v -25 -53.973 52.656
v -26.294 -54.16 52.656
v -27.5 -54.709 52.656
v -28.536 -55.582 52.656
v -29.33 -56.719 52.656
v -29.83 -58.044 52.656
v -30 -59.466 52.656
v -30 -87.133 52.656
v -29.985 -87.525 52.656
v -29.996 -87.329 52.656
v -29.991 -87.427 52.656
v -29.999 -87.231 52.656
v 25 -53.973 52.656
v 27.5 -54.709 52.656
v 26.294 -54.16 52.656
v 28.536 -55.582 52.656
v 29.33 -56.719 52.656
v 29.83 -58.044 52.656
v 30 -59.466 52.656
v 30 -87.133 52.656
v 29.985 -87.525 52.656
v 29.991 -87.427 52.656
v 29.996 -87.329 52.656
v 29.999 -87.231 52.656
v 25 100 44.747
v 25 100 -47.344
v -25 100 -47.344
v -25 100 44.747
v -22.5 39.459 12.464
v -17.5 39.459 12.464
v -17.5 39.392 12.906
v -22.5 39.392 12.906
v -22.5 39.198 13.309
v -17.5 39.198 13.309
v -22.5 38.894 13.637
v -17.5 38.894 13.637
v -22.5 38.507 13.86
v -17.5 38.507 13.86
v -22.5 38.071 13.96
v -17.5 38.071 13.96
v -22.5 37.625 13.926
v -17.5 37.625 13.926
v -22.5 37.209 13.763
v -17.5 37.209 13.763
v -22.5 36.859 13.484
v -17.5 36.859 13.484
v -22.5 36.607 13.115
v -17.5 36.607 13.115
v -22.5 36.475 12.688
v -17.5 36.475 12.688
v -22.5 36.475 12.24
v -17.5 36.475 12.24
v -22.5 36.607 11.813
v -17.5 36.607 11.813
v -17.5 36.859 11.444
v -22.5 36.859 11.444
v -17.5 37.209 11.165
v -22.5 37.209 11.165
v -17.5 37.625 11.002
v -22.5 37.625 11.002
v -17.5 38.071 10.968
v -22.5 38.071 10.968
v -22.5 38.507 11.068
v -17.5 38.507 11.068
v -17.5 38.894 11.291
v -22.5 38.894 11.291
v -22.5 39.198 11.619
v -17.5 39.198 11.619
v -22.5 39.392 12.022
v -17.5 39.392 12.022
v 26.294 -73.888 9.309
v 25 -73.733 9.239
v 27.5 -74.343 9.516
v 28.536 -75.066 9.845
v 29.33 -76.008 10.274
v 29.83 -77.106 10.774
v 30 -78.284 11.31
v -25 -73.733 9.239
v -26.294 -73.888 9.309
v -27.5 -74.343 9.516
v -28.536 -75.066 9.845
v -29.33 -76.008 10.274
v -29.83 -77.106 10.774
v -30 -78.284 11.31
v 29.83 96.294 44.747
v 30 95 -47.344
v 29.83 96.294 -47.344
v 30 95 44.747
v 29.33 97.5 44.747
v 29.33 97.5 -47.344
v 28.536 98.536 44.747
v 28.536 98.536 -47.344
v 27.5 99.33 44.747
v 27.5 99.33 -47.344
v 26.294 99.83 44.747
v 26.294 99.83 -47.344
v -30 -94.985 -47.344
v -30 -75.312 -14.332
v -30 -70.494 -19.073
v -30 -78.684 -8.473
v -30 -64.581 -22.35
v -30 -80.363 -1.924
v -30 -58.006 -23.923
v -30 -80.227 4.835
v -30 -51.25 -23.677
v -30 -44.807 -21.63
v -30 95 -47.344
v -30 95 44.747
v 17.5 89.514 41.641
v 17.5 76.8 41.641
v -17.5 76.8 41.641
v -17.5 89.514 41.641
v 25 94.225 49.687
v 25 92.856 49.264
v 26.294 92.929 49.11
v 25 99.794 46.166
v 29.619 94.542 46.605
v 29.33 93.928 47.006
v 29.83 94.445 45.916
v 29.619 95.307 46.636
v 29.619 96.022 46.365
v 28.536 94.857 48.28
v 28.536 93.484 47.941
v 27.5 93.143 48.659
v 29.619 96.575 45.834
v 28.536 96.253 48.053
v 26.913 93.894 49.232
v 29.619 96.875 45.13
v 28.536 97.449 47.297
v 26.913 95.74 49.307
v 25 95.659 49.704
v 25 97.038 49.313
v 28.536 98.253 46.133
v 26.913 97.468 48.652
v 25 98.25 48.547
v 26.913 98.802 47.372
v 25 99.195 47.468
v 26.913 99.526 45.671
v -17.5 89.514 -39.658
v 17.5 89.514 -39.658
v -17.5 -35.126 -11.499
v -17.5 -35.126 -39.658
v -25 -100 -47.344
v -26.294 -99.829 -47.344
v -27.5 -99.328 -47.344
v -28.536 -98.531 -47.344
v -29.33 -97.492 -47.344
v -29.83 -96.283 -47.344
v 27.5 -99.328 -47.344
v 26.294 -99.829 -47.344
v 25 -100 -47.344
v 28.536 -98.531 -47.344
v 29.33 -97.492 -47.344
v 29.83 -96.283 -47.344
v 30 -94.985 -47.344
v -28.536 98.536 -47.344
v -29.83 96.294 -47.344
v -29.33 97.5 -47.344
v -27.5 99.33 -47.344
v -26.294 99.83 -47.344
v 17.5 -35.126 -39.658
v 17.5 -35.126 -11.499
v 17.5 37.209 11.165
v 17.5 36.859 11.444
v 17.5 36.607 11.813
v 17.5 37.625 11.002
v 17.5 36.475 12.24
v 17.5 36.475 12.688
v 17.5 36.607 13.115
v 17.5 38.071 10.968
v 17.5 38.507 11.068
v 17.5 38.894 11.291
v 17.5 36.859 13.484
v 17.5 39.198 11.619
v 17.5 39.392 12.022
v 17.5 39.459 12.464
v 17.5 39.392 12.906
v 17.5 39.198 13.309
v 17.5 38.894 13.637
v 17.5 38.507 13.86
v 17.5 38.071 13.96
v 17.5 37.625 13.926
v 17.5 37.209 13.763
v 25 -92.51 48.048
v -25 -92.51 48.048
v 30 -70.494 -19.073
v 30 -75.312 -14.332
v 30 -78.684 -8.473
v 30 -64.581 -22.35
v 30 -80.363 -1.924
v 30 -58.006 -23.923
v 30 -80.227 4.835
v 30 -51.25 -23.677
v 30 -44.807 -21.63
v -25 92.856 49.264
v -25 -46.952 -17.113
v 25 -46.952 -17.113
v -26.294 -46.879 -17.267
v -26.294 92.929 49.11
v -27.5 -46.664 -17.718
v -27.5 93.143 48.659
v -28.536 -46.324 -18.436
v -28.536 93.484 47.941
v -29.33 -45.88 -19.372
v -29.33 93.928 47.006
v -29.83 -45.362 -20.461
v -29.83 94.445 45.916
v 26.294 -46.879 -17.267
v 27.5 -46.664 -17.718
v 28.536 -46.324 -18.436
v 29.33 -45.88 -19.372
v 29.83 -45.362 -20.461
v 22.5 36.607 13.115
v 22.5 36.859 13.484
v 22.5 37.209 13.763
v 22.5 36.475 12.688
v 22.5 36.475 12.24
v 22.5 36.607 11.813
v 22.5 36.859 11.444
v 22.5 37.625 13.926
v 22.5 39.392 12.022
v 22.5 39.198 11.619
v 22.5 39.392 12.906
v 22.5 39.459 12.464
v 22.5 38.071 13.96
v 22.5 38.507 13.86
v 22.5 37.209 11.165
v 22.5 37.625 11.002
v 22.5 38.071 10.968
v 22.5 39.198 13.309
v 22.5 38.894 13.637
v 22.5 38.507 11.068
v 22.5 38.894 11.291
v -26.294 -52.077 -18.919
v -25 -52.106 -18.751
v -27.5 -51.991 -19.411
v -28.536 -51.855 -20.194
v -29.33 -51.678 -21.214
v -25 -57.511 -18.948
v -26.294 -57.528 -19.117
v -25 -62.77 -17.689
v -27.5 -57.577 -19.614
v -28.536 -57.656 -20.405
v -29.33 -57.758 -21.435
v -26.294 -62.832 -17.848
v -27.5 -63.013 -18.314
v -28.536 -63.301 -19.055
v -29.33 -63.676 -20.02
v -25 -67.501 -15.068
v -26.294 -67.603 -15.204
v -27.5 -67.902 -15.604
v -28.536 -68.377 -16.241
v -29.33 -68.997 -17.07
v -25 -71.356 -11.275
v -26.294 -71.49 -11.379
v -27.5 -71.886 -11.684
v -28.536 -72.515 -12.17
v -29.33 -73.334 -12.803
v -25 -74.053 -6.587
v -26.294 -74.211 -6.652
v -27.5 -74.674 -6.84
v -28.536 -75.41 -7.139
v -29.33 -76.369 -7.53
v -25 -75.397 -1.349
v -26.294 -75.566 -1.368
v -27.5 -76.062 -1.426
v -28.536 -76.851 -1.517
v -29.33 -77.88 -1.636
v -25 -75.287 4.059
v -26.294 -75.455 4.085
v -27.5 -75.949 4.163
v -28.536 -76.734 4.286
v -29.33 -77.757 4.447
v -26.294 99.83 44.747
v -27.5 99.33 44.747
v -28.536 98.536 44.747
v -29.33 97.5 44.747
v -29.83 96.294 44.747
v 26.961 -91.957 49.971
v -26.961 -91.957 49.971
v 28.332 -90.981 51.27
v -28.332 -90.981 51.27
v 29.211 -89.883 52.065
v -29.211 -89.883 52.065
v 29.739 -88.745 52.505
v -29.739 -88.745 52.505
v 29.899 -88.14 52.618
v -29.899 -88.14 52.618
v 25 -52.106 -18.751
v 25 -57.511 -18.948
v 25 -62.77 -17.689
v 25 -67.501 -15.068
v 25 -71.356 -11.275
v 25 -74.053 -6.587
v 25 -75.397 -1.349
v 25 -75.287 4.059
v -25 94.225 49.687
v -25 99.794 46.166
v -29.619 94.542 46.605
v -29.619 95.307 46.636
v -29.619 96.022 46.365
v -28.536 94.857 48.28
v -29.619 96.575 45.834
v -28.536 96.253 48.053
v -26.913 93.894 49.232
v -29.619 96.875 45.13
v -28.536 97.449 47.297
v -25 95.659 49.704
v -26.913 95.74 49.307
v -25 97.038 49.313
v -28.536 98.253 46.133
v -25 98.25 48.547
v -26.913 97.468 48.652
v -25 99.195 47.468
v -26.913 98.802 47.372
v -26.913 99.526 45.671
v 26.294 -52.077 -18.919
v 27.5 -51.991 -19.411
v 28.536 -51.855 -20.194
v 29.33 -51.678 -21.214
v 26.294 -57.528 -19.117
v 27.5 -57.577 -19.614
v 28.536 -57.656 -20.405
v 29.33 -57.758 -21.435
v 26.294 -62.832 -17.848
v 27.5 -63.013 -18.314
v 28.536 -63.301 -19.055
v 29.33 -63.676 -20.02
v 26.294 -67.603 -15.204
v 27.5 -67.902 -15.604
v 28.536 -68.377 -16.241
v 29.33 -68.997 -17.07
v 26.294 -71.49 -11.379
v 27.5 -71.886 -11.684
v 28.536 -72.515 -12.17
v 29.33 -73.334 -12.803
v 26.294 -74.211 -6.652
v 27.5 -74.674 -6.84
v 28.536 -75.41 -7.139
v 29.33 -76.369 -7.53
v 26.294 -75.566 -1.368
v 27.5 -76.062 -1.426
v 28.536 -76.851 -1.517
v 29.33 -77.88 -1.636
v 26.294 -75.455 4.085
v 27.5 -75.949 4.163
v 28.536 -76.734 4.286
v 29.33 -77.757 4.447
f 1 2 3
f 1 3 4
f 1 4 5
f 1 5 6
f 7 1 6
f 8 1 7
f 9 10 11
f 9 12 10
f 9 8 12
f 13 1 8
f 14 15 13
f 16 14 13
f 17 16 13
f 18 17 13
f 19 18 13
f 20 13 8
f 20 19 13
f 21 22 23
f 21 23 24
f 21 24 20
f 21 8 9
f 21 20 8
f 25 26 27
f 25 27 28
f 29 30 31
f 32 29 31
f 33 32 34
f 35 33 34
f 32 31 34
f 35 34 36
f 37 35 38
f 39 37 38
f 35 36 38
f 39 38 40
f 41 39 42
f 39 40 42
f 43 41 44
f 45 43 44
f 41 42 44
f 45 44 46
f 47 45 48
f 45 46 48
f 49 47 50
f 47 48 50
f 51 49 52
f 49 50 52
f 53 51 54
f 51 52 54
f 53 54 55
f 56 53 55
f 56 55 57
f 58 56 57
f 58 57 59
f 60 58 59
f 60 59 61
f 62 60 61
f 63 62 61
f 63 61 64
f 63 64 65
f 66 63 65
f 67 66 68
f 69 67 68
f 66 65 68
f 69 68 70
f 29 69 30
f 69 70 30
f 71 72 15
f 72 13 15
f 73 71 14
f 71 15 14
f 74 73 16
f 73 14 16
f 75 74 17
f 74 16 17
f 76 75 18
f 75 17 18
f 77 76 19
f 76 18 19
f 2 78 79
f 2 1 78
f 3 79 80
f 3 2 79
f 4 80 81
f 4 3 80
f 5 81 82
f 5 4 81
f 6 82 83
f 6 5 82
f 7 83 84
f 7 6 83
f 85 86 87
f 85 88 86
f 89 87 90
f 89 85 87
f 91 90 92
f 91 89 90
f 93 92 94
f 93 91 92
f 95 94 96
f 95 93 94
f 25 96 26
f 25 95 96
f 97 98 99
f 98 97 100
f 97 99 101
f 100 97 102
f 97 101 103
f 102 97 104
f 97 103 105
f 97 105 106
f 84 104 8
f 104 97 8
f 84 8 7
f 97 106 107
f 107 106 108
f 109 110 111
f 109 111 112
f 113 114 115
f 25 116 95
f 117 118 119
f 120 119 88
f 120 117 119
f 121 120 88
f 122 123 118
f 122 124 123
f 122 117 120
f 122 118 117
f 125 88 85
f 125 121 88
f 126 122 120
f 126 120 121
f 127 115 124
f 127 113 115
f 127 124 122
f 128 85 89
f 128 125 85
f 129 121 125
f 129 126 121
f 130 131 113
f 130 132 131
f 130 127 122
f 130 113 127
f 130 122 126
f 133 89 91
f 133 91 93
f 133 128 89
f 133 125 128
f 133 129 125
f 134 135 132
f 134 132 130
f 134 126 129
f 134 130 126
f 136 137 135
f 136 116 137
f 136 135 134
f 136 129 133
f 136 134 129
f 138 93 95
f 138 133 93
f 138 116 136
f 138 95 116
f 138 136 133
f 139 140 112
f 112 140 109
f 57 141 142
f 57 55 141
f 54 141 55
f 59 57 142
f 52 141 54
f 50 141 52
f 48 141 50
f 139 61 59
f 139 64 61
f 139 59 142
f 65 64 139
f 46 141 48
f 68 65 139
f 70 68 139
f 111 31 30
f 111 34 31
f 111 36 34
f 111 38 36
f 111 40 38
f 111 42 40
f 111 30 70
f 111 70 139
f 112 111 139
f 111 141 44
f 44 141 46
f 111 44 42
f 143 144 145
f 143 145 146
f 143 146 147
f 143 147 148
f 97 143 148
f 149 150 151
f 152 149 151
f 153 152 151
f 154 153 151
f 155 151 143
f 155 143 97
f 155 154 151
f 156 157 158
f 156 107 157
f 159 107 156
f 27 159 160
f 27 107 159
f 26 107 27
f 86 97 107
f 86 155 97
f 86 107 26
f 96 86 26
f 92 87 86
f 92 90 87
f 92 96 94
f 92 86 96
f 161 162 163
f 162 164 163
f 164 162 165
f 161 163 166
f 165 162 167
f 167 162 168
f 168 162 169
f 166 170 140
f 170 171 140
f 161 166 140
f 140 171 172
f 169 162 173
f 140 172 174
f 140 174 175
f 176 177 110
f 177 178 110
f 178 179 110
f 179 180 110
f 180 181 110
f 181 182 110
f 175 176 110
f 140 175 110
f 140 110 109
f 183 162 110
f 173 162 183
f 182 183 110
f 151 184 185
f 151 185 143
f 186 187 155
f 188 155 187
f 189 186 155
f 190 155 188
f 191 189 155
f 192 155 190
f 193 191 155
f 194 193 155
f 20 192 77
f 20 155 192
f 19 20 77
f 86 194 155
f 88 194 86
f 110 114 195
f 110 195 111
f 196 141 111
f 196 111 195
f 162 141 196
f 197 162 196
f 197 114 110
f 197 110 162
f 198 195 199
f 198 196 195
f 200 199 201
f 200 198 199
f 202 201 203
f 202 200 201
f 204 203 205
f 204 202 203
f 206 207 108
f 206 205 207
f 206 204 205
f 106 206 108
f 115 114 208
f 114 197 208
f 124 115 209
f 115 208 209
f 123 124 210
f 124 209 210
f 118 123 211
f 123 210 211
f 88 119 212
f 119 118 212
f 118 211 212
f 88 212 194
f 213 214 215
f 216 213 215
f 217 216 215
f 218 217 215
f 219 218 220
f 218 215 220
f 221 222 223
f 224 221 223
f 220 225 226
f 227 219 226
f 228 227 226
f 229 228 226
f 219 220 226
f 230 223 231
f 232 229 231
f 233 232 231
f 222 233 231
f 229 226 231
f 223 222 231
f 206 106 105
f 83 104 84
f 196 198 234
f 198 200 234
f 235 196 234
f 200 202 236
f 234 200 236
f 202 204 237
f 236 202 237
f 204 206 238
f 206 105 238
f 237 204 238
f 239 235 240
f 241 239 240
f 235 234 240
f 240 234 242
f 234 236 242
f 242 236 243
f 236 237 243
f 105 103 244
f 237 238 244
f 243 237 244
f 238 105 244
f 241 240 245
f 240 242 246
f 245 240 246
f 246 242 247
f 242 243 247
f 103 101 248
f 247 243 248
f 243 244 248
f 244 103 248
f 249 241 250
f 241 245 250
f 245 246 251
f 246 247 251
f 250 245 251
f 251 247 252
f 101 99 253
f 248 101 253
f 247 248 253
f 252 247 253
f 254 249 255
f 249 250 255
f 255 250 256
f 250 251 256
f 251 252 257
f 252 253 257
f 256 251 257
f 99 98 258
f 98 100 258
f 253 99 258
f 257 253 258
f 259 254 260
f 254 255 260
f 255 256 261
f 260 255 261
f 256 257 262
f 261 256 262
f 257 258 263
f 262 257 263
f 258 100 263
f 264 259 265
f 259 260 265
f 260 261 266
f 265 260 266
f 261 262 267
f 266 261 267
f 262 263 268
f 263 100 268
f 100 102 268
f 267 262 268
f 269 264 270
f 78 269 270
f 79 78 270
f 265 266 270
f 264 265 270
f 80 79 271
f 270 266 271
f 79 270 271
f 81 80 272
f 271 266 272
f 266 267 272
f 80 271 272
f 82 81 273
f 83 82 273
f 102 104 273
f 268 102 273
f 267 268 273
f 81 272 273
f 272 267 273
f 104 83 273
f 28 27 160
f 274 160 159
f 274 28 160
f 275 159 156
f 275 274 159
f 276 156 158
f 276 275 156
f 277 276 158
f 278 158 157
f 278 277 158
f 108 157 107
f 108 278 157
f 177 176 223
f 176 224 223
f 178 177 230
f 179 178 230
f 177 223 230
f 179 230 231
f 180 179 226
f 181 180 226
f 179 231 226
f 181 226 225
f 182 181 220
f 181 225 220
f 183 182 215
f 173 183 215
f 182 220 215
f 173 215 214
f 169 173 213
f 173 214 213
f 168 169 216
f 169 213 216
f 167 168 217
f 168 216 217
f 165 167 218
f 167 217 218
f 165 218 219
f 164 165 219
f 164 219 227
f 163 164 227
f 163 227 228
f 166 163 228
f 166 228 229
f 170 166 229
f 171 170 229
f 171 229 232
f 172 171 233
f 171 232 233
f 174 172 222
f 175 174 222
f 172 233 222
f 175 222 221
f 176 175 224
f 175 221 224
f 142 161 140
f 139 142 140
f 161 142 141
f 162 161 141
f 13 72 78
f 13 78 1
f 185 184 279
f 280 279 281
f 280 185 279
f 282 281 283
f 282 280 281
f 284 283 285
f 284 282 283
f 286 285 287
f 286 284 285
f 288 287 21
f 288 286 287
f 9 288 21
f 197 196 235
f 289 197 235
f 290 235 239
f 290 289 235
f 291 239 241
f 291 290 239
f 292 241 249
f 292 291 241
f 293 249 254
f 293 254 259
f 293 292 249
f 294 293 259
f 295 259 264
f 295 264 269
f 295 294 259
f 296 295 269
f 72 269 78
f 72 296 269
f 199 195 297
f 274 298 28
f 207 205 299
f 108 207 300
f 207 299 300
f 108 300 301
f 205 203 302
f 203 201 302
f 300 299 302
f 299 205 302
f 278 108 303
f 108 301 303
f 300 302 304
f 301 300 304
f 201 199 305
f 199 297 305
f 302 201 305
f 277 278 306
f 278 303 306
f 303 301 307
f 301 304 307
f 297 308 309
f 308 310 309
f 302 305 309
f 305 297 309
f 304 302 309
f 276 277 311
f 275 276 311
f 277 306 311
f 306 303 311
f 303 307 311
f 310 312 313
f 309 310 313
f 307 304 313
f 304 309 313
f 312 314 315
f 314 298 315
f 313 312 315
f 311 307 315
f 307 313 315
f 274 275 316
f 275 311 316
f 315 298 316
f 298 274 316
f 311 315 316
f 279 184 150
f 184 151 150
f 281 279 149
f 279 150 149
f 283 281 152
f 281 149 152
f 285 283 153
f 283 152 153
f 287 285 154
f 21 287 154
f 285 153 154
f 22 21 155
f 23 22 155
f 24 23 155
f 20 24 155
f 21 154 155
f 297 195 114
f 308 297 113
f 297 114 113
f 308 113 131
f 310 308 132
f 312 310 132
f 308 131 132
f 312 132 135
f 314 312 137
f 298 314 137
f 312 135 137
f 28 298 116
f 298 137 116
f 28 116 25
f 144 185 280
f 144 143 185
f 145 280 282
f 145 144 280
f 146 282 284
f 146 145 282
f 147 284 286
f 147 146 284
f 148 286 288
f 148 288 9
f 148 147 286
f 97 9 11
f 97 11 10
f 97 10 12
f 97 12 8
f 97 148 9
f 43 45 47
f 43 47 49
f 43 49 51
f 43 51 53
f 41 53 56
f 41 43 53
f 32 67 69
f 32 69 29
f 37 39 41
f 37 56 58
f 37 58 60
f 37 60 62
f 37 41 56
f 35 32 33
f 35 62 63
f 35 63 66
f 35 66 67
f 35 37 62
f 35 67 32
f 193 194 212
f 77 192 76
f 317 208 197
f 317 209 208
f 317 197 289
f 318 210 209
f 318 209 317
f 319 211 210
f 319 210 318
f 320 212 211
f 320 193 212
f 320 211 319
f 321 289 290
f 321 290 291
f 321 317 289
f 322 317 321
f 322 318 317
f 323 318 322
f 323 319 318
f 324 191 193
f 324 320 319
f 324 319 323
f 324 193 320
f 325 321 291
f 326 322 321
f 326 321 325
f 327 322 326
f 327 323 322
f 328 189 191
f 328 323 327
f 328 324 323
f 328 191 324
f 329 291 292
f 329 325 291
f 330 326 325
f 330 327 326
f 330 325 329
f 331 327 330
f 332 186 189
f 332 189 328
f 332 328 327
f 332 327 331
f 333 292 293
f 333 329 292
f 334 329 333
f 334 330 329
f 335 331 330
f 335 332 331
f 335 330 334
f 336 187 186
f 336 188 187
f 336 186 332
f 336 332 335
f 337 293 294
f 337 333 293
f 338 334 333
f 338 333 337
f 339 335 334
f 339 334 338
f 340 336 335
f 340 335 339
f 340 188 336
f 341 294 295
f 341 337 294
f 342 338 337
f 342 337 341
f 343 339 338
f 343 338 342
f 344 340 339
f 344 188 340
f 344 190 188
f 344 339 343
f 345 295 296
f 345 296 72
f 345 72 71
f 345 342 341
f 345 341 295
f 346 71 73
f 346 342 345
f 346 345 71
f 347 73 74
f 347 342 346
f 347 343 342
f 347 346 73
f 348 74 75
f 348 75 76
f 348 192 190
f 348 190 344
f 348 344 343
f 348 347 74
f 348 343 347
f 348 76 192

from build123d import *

# Parameters (mm, degrees)
F1_DEPTH = 30
F2_R     = 5
F3_W     = 124.640293
F3_H     = 81.299469
F4_DEPTH = 17.5
F5_R     = 1.5
F6_DEPTH = 22.5


with BuildPart() as f1:
    # F0 (on Right) → F1 (new body, symmetric)
    with BuildSketch(Plane.YZ):
        with BuildLine():
            Line((-100, -47.343845), (100, -47.343845))
            Line((100, -47.343845), (100, 52.656155))
            Line((100, 52.656155), (-46.951734, -17.113248))
            ThreePointArc((-46.951734, -17.113248), (-69.557005, -13.302077), (-73.732945, 9.238661))
            Line((-73.732945, 9.238661), (-53.972553, 52.656155))
            Line((-53.972553, 52.656155), (-92.148267, 52.656155))
            Line((-92.148267, 52.656155), (-100, -47.343845))
        make_face()
    extrude(amount=F1_DEPTH, both=True)

    # F2
    f2_edges = [f1.edges().sort_by_distance(p)[0] for p in [
        (0, -92.148267, 52.656155),
        (0, 100, 52.656155),
        (30, 26.524133, 17.771454),
        (-30, 26.524133, 17.771454),
        (30, 100, 2.656155),
        (-30, 100, 2.656155),
        (30, -96.074133, 2.656155),
        (-30, -96.074133, 2.656155),
    ]]
    fillet(f2_edges, radius=F2_R)

    # F3 (on Right) → F4 (cut, symmetric)
    with BuildSketch(Plane.YZ):
        with Locations((27.194251, 0.991457)):
            Rectangle(F3_W, F3_H)
    extrude(amount=F4_DEPTH, both=True, mode=Mode.SUBTRACT)

    # F5 (on Right) → F6 (cut, symmetric)
    with BuildSketch(Plane.YZ):
        with Locations((37.958637, 12.46403)):
            Circle(F5_R)
    extrude(amount=F6_DEPTH, both=True, mode=Mode.SUBTRACT)


solid = f1.part
